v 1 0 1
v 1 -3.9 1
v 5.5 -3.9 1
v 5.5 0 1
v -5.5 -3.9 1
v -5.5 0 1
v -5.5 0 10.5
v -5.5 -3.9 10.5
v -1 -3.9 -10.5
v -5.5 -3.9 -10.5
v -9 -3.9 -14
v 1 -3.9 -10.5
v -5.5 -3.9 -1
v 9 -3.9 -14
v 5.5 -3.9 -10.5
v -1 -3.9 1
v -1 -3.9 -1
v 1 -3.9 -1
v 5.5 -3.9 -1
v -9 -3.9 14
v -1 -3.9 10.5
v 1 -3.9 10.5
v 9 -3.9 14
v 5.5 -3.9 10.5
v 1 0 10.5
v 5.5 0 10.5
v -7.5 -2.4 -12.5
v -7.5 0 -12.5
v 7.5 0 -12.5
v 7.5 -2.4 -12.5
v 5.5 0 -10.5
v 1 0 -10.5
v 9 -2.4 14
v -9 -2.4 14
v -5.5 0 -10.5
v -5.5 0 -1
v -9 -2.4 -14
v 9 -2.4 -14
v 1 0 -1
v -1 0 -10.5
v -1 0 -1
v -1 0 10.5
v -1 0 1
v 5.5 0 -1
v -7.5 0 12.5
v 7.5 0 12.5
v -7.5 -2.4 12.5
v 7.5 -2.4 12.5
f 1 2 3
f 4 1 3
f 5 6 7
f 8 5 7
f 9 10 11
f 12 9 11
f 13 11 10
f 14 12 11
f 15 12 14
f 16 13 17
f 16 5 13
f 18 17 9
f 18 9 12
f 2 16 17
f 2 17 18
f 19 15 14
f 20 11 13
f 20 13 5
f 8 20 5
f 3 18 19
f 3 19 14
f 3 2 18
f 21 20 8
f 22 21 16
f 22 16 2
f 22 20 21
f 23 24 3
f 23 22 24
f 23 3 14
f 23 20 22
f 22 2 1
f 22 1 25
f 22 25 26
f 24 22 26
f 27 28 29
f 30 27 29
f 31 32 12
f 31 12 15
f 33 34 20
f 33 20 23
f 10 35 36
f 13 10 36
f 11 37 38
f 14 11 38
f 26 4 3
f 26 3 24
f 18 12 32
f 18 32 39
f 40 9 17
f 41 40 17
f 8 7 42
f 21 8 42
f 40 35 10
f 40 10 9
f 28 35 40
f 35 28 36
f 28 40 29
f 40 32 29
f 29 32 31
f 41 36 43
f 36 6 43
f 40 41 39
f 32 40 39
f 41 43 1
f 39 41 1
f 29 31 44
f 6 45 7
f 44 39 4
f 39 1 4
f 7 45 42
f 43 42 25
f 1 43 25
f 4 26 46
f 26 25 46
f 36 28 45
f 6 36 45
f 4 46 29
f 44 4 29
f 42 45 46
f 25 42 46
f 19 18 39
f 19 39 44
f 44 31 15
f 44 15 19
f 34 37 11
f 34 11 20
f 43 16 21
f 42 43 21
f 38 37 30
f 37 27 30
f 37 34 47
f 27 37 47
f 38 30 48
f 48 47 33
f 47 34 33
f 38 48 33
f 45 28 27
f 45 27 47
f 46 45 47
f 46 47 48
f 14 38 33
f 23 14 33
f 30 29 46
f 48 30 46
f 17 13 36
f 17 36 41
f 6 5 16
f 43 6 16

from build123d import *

# Parameters (mm, degrees)
F0_W     = 15
F0_H     = 25
F0_W_2   = 11
F0_H_2   = 21
F1_DEPTH = 2.4
F2_W     = 18
F2_H     = 28
F2_W_2   = 15
F2_H_2   = 25
F2_W_3   = 11
F2_H_3   = 21
F3_DEPTH = 1.5
F4_W     = 4.5
F4_H     = 2
F4_W_2   = 2
F4_H_2   = 9.5
F5_DEPTH = 3.9


with BuildPart() as f1:
    # F0 (on Front) → F1 (new body)
    with BuildSketch(Plane.XZ):
        Rectangle(F0_W, F0_H)
        Rectangle(F0_W_2, F0_H_2, mode=Mode.SUBTRACT)
    extrude(amount=F1_DEPTH)

    # F2 (on face) → F3 (join)
    with BuildSketch(Plane.XZ.offset(2.4)):
        Rectangle(F2_W, F2_H)
        Rectangle(F2_W_2, F2_H_2, mode=Mode.SUBTRACT)
        Rectangle(F2_W_2, F2_H_2)
        Rectangle(F2_W_3, F2_H_3, mode=Mode.SUBTRACT)
    extrude(amount=F3_DEPTH)

    # F4 (on face) → F5 (join)
    with BuildSketch(Plane.XZ.offset(3.9)):
        with Locations((-3.25, 0)):
            Rectangle(F4_W, F4_H)
        with Locations((0, 5.75)):
            Rectangle(F4_W_2, F4_H_2)
        Rectangle(F4_W_2, F4_H)
        with Locations((3.25, 0)):
            Rectangle(F4_W, F4_H)
        with Locations((0, -5.75)):
            Rectangle(F4_W_2, F4_H_2)
    extrude(amount=-F5_DEPTH)


solid = f1.part
